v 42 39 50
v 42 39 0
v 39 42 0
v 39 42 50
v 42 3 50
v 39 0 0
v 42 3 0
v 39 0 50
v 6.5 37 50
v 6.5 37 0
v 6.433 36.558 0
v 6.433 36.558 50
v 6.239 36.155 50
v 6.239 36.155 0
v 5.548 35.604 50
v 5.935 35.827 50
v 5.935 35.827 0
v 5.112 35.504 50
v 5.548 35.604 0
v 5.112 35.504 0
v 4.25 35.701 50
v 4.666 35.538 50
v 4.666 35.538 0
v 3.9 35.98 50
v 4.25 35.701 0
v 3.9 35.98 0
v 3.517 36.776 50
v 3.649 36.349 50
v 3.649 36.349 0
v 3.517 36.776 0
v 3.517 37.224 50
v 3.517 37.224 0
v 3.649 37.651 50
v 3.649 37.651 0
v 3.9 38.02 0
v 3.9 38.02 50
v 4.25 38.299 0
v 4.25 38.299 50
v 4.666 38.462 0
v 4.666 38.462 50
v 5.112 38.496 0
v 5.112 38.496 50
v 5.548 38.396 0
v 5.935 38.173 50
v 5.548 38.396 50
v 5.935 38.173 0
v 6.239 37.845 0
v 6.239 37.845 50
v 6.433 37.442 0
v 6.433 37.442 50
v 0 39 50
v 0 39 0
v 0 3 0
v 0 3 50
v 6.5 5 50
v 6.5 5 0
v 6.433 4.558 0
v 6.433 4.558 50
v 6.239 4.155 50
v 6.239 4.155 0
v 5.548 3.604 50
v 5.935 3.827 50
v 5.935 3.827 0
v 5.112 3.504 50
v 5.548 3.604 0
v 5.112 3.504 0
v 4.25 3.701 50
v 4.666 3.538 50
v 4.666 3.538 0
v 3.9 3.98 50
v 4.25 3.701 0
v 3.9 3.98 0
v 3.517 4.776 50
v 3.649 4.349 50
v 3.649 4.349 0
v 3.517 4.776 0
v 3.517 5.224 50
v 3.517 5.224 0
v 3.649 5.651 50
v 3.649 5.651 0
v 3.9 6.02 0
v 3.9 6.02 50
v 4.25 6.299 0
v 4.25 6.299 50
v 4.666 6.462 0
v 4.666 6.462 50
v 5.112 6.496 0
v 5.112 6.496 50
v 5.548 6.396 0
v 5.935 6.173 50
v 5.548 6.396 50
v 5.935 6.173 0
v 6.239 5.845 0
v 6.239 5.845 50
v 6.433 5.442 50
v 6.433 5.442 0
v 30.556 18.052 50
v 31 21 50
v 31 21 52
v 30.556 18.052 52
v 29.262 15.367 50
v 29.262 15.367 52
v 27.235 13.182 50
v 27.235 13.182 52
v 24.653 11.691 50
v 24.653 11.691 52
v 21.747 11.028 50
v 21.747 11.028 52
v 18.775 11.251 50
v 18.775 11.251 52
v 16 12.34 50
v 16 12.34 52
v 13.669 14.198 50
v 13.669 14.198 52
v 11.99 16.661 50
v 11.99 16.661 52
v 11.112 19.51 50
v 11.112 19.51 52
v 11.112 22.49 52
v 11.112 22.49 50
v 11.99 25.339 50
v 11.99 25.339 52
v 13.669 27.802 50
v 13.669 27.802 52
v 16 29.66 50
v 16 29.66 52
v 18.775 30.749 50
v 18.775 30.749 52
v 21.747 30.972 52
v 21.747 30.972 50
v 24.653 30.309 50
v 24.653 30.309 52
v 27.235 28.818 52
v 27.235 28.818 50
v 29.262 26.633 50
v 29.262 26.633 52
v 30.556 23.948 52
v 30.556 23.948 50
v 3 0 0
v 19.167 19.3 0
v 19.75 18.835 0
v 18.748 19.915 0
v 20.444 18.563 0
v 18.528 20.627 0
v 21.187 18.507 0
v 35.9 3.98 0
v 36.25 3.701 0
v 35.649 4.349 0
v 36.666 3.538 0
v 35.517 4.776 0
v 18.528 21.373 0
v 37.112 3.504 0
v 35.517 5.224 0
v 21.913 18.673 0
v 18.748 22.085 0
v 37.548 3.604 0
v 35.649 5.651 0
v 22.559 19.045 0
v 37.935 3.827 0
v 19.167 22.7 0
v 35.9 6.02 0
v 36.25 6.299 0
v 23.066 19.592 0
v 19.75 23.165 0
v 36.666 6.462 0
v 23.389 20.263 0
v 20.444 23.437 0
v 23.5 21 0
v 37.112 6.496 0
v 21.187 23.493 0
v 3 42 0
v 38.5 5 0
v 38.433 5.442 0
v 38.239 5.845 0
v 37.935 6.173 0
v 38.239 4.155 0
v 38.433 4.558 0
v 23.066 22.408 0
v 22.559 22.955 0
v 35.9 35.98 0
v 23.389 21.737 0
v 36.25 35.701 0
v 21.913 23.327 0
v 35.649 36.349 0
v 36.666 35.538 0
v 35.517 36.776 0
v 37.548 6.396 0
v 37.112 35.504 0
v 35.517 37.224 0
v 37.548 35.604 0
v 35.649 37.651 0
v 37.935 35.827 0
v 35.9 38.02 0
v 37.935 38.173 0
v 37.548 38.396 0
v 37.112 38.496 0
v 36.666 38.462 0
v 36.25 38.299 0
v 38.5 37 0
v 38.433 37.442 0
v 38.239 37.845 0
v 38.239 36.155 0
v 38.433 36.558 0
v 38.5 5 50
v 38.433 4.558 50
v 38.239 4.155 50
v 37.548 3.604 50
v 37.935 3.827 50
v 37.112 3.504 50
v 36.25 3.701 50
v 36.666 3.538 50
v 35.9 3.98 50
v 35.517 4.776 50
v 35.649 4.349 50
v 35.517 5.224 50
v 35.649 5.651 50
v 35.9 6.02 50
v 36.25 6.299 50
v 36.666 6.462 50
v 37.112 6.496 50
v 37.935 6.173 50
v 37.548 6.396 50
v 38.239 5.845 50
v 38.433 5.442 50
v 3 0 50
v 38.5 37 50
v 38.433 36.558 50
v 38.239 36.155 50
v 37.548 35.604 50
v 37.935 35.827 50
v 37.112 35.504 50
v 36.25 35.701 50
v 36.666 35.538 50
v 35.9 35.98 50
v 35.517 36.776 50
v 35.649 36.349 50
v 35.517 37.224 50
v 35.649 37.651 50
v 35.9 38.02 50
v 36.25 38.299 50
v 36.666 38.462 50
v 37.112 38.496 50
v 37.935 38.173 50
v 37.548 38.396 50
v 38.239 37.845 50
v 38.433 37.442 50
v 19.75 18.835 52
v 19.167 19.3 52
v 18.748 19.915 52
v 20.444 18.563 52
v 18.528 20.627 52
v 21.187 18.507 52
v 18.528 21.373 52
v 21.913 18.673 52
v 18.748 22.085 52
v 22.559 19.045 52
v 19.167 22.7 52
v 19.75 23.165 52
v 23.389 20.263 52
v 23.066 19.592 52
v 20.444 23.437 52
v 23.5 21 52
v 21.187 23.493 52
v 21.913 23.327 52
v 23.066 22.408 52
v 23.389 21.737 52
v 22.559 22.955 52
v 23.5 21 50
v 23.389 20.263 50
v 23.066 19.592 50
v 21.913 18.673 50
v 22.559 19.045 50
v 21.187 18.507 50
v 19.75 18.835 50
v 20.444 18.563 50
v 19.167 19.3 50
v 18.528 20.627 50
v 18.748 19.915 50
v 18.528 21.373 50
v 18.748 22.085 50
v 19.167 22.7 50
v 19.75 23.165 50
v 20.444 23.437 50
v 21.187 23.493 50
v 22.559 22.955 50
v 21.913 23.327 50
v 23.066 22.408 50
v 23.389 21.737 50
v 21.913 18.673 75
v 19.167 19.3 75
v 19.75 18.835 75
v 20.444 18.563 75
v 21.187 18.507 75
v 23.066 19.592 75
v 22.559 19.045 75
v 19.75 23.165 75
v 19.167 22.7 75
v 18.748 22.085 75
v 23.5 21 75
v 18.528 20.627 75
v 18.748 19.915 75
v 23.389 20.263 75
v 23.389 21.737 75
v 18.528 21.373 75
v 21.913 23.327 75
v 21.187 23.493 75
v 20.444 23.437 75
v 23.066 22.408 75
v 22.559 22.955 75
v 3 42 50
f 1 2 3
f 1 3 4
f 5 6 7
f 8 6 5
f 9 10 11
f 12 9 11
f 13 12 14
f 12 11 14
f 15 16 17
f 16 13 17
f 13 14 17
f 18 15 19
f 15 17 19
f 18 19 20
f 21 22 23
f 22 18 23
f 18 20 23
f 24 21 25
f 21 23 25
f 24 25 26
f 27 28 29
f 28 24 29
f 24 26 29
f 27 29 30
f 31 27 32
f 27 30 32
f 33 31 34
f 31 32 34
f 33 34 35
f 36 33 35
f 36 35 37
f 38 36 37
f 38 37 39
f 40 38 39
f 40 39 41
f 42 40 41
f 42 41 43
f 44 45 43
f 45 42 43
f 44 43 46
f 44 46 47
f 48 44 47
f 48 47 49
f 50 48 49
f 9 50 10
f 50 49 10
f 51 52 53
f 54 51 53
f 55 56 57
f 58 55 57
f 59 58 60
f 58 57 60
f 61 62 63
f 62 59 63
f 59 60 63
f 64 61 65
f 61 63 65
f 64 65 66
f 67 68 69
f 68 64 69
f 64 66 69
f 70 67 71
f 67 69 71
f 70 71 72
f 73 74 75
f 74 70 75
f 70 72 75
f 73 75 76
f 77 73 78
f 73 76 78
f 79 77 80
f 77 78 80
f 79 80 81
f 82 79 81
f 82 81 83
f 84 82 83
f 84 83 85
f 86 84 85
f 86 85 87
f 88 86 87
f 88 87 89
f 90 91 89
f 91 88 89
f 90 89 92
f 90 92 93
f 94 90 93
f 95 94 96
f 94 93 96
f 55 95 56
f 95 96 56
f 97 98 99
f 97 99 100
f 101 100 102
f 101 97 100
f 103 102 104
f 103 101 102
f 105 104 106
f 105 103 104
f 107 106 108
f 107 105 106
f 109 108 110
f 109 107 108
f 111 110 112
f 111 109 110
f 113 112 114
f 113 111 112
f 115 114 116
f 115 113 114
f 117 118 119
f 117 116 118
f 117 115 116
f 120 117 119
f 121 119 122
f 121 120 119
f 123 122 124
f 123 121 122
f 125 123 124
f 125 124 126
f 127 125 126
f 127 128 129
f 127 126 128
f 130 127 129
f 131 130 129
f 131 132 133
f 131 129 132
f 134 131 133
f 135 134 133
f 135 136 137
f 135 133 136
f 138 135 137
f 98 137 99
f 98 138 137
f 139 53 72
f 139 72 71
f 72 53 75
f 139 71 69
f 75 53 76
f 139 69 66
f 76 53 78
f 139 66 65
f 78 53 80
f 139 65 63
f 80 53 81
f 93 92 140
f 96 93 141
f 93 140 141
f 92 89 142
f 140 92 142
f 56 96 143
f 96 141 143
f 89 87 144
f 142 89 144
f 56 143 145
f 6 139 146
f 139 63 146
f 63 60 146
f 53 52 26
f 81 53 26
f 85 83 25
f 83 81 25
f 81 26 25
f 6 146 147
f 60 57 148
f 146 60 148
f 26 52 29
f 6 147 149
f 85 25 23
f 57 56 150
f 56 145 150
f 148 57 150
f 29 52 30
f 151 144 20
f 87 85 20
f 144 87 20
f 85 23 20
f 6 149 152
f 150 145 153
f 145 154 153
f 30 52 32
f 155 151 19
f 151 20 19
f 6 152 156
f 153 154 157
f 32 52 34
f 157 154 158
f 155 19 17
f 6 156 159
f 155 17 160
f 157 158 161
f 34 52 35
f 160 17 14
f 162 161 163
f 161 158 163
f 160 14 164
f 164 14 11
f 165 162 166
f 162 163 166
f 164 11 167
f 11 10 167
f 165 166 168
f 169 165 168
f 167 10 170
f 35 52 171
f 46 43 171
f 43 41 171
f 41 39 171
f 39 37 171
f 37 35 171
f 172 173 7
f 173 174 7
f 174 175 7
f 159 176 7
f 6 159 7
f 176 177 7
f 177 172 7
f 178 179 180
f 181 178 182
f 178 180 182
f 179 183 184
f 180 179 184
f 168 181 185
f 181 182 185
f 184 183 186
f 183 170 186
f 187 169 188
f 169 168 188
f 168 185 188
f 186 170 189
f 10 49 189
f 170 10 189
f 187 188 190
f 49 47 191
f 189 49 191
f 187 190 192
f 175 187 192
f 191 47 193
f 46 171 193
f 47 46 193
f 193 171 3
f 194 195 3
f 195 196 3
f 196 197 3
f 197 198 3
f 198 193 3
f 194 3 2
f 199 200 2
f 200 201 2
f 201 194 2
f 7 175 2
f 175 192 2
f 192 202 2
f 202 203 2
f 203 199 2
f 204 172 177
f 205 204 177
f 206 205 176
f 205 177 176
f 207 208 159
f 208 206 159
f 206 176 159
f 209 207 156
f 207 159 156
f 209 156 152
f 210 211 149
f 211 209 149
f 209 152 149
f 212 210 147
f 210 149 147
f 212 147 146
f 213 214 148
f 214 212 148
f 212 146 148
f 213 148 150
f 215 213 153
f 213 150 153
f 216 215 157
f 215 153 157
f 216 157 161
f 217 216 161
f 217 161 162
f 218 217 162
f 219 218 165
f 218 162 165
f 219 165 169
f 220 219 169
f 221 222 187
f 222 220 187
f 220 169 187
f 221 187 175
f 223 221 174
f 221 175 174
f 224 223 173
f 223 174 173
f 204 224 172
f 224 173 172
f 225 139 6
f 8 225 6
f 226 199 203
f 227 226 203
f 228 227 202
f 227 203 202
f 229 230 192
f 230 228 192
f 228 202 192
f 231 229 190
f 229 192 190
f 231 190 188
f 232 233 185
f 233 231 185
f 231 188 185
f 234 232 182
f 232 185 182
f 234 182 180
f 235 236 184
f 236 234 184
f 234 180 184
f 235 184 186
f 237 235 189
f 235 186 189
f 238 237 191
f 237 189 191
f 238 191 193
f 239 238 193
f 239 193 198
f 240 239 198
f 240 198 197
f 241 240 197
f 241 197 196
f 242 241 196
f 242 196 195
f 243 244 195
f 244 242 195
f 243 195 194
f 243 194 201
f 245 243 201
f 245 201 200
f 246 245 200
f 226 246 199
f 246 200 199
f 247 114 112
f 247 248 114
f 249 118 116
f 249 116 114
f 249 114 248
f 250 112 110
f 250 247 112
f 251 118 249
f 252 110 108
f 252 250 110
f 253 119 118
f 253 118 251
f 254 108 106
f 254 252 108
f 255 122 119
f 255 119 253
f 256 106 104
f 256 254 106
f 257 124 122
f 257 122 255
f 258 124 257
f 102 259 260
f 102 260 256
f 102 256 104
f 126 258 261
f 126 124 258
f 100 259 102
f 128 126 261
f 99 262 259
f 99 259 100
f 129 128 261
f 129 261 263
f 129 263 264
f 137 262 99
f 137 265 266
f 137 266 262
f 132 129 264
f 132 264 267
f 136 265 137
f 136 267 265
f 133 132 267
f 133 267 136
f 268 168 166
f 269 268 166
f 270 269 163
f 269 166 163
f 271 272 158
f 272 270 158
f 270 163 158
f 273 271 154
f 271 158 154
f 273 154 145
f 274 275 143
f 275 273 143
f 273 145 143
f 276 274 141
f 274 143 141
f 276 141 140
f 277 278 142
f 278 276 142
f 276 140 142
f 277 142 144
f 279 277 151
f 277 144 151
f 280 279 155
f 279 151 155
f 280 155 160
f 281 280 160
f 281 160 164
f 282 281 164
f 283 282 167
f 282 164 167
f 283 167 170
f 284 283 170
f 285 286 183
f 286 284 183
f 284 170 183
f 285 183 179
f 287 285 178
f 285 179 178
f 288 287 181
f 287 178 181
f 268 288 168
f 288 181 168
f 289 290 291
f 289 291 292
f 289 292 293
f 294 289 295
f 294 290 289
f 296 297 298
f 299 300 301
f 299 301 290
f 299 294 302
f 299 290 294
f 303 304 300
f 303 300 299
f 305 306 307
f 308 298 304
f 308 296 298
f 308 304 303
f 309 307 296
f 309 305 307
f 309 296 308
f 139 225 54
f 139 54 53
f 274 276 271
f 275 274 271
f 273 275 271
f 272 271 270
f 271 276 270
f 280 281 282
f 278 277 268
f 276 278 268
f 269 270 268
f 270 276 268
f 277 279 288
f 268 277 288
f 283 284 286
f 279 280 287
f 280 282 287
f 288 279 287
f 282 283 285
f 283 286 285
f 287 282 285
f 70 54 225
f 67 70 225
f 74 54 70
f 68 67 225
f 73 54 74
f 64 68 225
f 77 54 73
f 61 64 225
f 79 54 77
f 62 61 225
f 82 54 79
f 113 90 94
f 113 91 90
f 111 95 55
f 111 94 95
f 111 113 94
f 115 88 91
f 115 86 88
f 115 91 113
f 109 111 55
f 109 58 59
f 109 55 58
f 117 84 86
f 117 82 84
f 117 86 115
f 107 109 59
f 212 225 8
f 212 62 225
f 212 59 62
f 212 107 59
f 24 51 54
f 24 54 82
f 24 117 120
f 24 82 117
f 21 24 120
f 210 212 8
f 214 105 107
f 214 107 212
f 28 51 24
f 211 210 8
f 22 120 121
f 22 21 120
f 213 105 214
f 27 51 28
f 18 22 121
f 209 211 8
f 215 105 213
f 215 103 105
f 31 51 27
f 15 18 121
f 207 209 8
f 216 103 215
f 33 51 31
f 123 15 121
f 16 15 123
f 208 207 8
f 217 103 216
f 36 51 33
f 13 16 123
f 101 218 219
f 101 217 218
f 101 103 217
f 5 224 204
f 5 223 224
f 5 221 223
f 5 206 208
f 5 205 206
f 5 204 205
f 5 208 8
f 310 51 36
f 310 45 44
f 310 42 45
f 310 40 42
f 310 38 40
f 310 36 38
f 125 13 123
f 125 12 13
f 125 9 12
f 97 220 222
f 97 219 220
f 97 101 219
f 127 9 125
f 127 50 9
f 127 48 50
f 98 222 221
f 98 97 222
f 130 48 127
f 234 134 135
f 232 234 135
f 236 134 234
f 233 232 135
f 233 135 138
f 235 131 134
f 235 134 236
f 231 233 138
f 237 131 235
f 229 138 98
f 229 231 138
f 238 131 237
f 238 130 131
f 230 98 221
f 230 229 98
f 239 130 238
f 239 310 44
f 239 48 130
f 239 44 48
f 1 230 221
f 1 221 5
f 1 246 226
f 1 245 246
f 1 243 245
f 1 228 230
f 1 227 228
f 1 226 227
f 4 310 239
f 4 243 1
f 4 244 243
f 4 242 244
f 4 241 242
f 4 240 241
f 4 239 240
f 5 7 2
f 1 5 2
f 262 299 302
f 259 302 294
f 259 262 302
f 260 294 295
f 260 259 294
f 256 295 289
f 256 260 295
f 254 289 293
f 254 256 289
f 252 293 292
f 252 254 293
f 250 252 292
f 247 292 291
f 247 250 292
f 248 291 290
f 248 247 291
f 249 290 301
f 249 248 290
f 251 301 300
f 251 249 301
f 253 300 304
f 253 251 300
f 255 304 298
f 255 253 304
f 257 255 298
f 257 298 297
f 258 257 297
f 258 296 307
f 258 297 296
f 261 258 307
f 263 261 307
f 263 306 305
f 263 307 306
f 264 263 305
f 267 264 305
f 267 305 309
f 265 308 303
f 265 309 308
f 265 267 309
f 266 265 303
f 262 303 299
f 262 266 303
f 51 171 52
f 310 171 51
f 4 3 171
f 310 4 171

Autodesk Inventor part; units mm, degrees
ref_plane "YZ Plane" through (0, 0, 0) normal (1, 0, 0) x (0, 1, 0)
ref_plane "XZ Plane" through (0, 0, 0) normal (0, 1, 0) x (-1, 0, 0)
ref_plane "XY Plane" through (0, 0, 0) normal (0, 0, 1) x (1, 0, 0)
sketch "Sketch1" plane through (0, 0, 0) normal (0, 0, 1) x (1, 0, 0)
  line L0 (0, 0) -> (42, 0)
  line L1 (42, 0) -> (42, 42)
  line L2 (42, 42) -> (0, 42)
  line L3 (0, 42) -> (0, 0)
  line L4 (5, 37) -> (37, 37) construction
  line L5 (37, 37) -> (37, 5) construction
  line L6 (37, 5) -> (5, 5) construction
  line L7 (5, 5) -> (5, 37) construction
  circle A0 centre (5, 37) radius 1.5
  circle A1 centre (37, 37) radius 1.5
  circle A2 centre (37, 5) radius 1.5
  circle A3 centre (5, 5) radius 1.5
  circle A4 centre (21, 21) radius 2.5
  point P0 (21, 42)
  point P1 (42, 21)
  dimension "d0" = 42
  dimension "d1" = 42
  dimension "d2" = 32
  dimension "d3" = 3
  dimension "d4" = 3
  dimension "d5" = 3
  dimension "d6" = 3
  dimension "d9" = 5
extrude "Extrusion1" add sketch "Sketch1" along normal blind 50
chamfer "Chamfer1" distance 3 angle 45 4 edges at (42, 42, 25) (42, 0, 25) (0, 0, 25) (0, 42, 25)
sketch "Sketch2" plane through (0, 0, 50) normal (0, 0, 1) x (1, 0, 0)
  circle A0 centre (21, 21) radius 2.5 construction
  circle A1 centre (21, 21) radius 10
  point P0 (0, 0)
  dimension "d13" = 20
sketch "Sketch3" plane through (0, 0, 50) normal (0, 0, 1) x (1, 0, 0)
  circle A0 centre (21, 21) radius 2.5 projected
  point P0 (0, 0)
extrude "Extrusion2" add sketch "Sketch3" along normal blind 25
extrude "Extrusion3" add sketch "Sketch2" along normal blind 2
properties part number "NEMA42"
